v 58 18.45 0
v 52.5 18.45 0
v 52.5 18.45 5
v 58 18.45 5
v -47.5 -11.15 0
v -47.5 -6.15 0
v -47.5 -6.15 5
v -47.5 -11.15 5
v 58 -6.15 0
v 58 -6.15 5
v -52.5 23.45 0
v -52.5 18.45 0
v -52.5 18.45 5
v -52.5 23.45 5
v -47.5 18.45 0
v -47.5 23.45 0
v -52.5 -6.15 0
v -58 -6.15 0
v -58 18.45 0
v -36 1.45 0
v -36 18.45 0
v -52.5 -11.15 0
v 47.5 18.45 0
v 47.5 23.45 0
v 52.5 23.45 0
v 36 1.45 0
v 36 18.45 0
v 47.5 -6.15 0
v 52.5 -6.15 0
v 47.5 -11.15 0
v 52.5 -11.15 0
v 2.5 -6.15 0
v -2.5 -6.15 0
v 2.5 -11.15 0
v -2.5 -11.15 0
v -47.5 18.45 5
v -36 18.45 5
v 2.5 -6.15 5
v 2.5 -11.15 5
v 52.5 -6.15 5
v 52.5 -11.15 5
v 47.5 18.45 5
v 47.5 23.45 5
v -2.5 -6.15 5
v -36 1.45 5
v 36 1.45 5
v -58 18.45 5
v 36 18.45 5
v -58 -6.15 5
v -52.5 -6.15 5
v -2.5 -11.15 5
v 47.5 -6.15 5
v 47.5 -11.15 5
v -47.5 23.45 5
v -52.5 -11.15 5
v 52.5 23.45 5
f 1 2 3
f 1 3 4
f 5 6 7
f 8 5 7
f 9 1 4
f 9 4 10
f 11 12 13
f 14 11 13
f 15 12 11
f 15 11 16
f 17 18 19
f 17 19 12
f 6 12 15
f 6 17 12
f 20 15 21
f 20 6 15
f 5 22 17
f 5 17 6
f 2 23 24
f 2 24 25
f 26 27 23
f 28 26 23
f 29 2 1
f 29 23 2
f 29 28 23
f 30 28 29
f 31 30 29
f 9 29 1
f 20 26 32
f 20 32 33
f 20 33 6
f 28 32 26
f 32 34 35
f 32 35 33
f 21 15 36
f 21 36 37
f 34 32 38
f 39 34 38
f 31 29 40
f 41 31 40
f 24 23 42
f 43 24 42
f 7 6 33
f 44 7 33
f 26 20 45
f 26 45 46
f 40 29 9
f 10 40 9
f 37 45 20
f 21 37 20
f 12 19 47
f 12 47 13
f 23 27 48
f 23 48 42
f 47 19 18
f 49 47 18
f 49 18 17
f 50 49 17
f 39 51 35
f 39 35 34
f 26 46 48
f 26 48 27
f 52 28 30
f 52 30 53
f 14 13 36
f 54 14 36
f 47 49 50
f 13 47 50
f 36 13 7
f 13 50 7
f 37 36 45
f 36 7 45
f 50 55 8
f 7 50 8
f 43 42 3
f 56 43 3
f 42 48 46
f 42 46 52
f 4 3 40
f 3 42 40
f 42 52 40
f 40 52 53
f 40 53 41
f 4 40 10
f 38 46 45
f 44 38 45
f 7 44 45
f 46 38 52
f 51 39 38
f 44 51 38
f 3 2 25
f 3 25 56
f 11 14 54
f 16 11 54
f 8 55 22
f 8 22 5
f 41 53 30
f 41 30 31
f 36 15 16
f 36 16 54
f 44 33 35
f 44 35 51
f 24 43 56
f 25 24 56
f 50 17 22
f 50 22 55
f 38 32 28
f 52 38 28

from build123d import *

# Parameters (mm, degrees)
SKETCH1_W           = 116
SKETCH1_H           = 12.3
BOSS_EXTRUDE1_DEPTH = 5
SKETCH2_W           = 5
SKETCH2_H           = 5
BOSS_EXTRUDE2_DEPTH = 5
SKETCH3_W           = 72
SKETCH3_H           = 5
CUT_EXTRUDE1_DEPTH  = 17
SKETCH4_W           = 5
SKETCH4_H           = 5
BOSS_EXTRUDE3_DEPTH = 5


with BuildPart() as part:
    # Sketch1 → Boss-Extrude1 (new body)
    with BuildSketch(Plane.XY):
        Rectangle(SKETCH1_W, SKETCH1_H)
    extrude(amount=BOSS_EXTRUDE1_DEPTH)

    # Sketch2 → Boss-Extrude2 (add)
    with BuildSketch(Plane.XZ.offset(6.15)):
        with Locations((-50, 2.5)):
            Rectangle(SKETCH2_W, SKETCH2_H)
        with Locations((50, 2.5)):
            Rectangle(SKETCH2_W, SKETCH2_H)
    extrude(amount=BOSS_EXTRUDE2_DEPTH)

    # Mirror1: part across plane


with BuildPart() as part_1:
    add(part.part)
    add(part.part.mirror(Plane(origin=(-58, 6.15, 5), x_dir=(0, 0, 1), z_dir=(0, -1, 0))))

    # Sketch3 → Cut-Extrude1 (cut)
    with BuildSketch(Plane(origin=(0, 18.45, 0), x_dir=(1, 0, 0), z_dir=(0, 1, 0))):
        with Locations((0, -2.5)):
            Rectangle(SKETCH3_W, SKETCH3_H)
    extrude(amount=-CUT_EXTRUDE1_DEPTH, mode=Mode.SUBTRACT)

    # Sketch4 → Boss-Extrude3 (add)
    with BuildSketch(Plane.XZ.offset(6.15)):
        with Locations((0, 2.5)):
            Rectangle(SKETCH4_W, SKETCH4_H)
    extrude(amount=BOSS_EXTRUDE3_DEPTH)


solid = part_1.part
